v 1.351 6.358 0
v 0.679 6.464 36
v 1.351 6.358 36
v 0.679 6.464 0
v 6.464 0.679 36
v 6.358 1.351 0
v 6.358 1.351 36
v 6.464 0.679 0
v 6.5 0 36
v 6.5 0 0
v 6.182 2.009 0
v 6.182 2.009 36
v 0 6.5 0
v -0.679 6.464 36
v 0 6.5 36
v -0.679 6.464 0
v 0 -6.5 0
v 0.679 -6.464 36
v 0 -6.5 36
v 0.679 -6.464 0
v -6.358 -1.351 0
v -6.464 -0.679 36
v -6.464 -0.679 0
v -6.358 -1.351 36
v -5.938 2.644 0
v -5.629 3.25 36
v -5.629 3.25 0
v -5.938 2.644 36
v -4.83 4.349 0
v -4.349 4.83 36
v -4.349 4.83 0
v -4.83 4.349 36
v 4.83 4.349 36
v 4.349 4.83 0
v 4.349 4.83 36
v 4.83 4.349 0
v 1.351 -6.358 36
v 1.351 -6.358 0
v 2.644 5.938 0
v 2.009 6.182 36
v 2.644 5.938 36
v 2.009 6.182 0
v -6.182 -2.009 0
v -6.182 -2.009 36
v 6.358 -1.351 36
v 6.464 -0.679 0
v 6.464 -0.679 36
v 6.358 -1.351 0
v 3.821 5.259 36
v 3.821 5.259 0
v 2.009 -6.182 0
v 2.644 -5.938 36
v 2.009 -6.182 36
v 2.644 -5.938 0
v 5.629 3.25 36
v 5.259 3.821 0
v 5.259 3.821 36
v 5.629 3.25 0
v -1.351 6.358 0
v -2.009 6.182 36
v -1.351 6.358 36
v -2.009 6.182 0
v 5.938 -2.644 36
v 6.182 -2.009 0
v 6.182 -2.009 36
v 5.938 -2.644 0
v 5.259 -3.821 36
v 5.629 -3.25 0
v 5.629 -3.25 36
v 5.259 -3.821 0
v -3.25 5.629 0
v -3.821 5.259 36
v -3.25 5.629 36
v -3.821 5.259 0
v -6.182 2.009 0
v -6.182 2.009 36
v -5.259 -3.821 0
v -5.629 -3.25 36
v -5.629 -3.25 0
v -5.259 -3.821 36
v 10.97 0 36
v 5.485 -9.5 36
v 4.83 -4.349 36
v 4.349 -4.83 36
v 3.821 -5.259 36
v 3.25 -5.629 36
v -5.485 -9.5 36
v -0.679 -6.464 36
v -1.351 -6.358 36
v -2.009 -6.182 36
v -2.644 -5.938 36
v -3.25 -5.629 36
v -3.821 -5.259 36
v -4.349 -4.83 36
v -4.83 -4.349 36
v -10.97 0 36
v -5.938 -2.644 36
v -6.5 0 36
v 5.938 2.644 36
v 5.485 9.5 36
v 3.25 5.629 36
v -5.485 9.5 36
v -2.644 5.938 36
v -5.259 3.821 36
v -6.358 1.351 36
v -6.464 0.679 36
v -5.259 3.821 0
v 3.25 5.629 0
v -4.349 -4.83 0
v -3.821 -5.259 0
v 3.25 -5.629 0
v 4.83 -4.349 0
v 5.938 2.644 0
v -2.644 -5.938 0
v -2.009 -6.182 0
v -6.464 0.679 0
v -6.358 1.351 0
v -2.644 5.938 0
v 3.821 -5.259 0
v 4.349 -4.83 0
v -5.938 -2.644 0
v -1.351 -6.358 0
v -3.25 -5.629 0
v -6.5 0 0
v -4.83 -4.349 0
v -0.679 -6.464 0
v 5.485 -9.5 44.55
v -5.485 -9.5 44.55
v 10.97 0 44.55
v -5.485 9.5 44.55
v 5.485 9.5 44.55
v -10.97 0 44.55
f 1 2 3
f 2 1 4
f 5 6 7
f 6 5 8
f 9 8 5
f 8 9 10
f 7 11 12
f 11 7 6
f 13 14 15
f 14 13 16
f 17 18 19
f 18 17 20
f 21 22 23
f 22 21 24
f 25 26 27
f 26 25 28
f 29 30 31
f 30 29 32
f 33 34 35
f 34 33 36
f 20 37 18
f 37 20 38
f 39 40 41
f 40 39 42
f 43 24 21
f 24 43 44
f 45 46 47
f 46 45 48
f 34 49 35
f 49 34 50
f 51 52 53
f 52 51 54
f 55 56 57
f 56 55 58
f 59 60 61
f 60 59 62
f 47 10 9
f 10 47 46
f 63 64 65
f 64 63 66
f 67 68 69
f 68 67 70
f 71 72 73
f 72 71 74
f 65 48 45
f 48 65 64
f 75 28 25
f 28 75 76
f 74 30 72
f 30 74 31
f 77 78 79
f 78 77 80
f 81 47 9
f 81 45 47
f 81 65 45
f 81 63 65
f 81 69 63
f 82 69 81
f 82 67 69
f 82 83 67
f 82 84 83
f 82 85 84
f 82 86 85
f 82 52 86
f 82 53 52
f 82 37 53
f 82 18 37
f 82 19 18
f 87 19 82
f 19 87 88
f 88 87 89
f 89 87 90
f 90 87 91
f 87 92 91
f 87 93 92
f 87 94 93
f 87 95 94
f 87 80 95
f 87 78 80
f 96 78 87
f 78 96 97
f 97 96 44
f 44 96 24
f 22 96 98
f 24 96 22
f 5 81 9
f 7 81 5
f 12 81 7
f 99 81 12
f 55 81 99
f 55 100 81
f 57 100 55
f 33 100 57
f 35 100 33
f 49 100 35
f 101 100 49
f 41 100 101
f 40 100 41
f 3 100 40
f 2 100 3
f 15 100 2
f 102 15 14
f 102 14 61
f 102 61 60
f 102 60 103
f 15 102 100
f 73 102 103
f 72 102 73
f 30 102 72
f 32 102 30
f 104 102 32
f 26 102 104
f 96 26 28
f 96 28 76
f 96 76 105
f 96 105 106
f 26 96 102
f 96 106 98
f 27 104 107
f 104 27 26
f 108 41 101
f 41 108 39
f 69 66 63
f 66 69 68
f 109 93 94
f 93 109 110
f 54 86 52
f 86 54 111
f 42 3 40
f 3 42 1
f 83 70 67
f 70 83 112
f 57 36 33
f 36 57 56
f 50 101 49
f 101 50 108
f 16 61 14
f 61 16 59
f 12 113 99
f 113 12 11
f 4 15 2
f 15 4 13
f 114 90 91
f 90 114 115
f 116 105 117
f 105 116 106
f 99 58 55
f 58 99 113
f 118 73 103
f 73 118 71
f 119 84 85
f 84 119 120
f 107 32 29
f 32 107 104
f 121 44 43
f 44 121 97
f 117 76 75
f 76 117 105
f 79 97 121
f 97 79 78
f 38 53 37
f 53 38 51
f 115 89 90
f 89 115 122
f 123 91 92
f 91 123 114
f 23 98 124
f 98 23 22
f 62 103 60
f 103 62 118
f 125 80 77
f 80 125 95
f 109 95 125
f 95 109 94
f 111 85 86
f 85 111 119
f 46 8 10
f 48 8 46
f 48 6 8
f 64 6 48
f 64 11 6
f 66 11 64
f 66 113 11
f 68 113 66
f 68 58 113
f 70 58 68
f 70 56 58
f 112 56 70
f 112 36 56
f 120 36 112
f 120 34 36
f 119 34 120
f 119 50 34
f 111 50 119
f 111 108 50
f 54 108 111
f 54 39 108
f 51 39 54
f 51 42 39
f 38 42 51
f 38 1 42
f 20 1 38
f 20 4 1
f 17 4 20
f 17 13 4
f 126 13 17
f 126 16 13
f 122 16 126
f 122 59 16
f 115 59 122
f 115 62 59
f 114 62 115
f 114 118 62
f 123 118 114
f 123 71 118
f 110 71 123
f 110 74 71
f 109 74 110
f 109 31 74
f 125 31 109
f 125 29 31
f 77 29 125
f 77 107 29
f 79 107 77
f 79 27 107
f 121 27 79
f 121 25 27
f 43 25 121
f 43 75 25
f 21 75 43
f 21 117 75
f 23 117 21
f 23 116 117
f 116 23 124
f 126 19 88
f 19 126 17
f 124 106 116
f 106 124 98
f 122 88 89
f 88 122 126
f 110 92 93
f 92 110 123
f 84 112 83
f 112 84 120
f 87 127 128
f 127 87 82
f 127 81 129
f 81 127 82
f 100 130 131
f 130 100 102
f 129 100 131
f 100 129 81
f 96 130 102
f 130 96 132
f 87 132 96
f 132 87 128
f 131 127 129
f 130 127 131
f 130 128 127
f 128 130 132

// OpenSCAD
// Hex-head bolt.
$fn = 60;
eps = 0.02;
thread_d = 13;
flat = 19;
shaft_l = 36;
union() { cylinder(d=thread_d,h=shaft_l); translate([0,0,shaft_l]) cylinder(d=flat/cos(30),h=flat*0.45,$fn=6); }
